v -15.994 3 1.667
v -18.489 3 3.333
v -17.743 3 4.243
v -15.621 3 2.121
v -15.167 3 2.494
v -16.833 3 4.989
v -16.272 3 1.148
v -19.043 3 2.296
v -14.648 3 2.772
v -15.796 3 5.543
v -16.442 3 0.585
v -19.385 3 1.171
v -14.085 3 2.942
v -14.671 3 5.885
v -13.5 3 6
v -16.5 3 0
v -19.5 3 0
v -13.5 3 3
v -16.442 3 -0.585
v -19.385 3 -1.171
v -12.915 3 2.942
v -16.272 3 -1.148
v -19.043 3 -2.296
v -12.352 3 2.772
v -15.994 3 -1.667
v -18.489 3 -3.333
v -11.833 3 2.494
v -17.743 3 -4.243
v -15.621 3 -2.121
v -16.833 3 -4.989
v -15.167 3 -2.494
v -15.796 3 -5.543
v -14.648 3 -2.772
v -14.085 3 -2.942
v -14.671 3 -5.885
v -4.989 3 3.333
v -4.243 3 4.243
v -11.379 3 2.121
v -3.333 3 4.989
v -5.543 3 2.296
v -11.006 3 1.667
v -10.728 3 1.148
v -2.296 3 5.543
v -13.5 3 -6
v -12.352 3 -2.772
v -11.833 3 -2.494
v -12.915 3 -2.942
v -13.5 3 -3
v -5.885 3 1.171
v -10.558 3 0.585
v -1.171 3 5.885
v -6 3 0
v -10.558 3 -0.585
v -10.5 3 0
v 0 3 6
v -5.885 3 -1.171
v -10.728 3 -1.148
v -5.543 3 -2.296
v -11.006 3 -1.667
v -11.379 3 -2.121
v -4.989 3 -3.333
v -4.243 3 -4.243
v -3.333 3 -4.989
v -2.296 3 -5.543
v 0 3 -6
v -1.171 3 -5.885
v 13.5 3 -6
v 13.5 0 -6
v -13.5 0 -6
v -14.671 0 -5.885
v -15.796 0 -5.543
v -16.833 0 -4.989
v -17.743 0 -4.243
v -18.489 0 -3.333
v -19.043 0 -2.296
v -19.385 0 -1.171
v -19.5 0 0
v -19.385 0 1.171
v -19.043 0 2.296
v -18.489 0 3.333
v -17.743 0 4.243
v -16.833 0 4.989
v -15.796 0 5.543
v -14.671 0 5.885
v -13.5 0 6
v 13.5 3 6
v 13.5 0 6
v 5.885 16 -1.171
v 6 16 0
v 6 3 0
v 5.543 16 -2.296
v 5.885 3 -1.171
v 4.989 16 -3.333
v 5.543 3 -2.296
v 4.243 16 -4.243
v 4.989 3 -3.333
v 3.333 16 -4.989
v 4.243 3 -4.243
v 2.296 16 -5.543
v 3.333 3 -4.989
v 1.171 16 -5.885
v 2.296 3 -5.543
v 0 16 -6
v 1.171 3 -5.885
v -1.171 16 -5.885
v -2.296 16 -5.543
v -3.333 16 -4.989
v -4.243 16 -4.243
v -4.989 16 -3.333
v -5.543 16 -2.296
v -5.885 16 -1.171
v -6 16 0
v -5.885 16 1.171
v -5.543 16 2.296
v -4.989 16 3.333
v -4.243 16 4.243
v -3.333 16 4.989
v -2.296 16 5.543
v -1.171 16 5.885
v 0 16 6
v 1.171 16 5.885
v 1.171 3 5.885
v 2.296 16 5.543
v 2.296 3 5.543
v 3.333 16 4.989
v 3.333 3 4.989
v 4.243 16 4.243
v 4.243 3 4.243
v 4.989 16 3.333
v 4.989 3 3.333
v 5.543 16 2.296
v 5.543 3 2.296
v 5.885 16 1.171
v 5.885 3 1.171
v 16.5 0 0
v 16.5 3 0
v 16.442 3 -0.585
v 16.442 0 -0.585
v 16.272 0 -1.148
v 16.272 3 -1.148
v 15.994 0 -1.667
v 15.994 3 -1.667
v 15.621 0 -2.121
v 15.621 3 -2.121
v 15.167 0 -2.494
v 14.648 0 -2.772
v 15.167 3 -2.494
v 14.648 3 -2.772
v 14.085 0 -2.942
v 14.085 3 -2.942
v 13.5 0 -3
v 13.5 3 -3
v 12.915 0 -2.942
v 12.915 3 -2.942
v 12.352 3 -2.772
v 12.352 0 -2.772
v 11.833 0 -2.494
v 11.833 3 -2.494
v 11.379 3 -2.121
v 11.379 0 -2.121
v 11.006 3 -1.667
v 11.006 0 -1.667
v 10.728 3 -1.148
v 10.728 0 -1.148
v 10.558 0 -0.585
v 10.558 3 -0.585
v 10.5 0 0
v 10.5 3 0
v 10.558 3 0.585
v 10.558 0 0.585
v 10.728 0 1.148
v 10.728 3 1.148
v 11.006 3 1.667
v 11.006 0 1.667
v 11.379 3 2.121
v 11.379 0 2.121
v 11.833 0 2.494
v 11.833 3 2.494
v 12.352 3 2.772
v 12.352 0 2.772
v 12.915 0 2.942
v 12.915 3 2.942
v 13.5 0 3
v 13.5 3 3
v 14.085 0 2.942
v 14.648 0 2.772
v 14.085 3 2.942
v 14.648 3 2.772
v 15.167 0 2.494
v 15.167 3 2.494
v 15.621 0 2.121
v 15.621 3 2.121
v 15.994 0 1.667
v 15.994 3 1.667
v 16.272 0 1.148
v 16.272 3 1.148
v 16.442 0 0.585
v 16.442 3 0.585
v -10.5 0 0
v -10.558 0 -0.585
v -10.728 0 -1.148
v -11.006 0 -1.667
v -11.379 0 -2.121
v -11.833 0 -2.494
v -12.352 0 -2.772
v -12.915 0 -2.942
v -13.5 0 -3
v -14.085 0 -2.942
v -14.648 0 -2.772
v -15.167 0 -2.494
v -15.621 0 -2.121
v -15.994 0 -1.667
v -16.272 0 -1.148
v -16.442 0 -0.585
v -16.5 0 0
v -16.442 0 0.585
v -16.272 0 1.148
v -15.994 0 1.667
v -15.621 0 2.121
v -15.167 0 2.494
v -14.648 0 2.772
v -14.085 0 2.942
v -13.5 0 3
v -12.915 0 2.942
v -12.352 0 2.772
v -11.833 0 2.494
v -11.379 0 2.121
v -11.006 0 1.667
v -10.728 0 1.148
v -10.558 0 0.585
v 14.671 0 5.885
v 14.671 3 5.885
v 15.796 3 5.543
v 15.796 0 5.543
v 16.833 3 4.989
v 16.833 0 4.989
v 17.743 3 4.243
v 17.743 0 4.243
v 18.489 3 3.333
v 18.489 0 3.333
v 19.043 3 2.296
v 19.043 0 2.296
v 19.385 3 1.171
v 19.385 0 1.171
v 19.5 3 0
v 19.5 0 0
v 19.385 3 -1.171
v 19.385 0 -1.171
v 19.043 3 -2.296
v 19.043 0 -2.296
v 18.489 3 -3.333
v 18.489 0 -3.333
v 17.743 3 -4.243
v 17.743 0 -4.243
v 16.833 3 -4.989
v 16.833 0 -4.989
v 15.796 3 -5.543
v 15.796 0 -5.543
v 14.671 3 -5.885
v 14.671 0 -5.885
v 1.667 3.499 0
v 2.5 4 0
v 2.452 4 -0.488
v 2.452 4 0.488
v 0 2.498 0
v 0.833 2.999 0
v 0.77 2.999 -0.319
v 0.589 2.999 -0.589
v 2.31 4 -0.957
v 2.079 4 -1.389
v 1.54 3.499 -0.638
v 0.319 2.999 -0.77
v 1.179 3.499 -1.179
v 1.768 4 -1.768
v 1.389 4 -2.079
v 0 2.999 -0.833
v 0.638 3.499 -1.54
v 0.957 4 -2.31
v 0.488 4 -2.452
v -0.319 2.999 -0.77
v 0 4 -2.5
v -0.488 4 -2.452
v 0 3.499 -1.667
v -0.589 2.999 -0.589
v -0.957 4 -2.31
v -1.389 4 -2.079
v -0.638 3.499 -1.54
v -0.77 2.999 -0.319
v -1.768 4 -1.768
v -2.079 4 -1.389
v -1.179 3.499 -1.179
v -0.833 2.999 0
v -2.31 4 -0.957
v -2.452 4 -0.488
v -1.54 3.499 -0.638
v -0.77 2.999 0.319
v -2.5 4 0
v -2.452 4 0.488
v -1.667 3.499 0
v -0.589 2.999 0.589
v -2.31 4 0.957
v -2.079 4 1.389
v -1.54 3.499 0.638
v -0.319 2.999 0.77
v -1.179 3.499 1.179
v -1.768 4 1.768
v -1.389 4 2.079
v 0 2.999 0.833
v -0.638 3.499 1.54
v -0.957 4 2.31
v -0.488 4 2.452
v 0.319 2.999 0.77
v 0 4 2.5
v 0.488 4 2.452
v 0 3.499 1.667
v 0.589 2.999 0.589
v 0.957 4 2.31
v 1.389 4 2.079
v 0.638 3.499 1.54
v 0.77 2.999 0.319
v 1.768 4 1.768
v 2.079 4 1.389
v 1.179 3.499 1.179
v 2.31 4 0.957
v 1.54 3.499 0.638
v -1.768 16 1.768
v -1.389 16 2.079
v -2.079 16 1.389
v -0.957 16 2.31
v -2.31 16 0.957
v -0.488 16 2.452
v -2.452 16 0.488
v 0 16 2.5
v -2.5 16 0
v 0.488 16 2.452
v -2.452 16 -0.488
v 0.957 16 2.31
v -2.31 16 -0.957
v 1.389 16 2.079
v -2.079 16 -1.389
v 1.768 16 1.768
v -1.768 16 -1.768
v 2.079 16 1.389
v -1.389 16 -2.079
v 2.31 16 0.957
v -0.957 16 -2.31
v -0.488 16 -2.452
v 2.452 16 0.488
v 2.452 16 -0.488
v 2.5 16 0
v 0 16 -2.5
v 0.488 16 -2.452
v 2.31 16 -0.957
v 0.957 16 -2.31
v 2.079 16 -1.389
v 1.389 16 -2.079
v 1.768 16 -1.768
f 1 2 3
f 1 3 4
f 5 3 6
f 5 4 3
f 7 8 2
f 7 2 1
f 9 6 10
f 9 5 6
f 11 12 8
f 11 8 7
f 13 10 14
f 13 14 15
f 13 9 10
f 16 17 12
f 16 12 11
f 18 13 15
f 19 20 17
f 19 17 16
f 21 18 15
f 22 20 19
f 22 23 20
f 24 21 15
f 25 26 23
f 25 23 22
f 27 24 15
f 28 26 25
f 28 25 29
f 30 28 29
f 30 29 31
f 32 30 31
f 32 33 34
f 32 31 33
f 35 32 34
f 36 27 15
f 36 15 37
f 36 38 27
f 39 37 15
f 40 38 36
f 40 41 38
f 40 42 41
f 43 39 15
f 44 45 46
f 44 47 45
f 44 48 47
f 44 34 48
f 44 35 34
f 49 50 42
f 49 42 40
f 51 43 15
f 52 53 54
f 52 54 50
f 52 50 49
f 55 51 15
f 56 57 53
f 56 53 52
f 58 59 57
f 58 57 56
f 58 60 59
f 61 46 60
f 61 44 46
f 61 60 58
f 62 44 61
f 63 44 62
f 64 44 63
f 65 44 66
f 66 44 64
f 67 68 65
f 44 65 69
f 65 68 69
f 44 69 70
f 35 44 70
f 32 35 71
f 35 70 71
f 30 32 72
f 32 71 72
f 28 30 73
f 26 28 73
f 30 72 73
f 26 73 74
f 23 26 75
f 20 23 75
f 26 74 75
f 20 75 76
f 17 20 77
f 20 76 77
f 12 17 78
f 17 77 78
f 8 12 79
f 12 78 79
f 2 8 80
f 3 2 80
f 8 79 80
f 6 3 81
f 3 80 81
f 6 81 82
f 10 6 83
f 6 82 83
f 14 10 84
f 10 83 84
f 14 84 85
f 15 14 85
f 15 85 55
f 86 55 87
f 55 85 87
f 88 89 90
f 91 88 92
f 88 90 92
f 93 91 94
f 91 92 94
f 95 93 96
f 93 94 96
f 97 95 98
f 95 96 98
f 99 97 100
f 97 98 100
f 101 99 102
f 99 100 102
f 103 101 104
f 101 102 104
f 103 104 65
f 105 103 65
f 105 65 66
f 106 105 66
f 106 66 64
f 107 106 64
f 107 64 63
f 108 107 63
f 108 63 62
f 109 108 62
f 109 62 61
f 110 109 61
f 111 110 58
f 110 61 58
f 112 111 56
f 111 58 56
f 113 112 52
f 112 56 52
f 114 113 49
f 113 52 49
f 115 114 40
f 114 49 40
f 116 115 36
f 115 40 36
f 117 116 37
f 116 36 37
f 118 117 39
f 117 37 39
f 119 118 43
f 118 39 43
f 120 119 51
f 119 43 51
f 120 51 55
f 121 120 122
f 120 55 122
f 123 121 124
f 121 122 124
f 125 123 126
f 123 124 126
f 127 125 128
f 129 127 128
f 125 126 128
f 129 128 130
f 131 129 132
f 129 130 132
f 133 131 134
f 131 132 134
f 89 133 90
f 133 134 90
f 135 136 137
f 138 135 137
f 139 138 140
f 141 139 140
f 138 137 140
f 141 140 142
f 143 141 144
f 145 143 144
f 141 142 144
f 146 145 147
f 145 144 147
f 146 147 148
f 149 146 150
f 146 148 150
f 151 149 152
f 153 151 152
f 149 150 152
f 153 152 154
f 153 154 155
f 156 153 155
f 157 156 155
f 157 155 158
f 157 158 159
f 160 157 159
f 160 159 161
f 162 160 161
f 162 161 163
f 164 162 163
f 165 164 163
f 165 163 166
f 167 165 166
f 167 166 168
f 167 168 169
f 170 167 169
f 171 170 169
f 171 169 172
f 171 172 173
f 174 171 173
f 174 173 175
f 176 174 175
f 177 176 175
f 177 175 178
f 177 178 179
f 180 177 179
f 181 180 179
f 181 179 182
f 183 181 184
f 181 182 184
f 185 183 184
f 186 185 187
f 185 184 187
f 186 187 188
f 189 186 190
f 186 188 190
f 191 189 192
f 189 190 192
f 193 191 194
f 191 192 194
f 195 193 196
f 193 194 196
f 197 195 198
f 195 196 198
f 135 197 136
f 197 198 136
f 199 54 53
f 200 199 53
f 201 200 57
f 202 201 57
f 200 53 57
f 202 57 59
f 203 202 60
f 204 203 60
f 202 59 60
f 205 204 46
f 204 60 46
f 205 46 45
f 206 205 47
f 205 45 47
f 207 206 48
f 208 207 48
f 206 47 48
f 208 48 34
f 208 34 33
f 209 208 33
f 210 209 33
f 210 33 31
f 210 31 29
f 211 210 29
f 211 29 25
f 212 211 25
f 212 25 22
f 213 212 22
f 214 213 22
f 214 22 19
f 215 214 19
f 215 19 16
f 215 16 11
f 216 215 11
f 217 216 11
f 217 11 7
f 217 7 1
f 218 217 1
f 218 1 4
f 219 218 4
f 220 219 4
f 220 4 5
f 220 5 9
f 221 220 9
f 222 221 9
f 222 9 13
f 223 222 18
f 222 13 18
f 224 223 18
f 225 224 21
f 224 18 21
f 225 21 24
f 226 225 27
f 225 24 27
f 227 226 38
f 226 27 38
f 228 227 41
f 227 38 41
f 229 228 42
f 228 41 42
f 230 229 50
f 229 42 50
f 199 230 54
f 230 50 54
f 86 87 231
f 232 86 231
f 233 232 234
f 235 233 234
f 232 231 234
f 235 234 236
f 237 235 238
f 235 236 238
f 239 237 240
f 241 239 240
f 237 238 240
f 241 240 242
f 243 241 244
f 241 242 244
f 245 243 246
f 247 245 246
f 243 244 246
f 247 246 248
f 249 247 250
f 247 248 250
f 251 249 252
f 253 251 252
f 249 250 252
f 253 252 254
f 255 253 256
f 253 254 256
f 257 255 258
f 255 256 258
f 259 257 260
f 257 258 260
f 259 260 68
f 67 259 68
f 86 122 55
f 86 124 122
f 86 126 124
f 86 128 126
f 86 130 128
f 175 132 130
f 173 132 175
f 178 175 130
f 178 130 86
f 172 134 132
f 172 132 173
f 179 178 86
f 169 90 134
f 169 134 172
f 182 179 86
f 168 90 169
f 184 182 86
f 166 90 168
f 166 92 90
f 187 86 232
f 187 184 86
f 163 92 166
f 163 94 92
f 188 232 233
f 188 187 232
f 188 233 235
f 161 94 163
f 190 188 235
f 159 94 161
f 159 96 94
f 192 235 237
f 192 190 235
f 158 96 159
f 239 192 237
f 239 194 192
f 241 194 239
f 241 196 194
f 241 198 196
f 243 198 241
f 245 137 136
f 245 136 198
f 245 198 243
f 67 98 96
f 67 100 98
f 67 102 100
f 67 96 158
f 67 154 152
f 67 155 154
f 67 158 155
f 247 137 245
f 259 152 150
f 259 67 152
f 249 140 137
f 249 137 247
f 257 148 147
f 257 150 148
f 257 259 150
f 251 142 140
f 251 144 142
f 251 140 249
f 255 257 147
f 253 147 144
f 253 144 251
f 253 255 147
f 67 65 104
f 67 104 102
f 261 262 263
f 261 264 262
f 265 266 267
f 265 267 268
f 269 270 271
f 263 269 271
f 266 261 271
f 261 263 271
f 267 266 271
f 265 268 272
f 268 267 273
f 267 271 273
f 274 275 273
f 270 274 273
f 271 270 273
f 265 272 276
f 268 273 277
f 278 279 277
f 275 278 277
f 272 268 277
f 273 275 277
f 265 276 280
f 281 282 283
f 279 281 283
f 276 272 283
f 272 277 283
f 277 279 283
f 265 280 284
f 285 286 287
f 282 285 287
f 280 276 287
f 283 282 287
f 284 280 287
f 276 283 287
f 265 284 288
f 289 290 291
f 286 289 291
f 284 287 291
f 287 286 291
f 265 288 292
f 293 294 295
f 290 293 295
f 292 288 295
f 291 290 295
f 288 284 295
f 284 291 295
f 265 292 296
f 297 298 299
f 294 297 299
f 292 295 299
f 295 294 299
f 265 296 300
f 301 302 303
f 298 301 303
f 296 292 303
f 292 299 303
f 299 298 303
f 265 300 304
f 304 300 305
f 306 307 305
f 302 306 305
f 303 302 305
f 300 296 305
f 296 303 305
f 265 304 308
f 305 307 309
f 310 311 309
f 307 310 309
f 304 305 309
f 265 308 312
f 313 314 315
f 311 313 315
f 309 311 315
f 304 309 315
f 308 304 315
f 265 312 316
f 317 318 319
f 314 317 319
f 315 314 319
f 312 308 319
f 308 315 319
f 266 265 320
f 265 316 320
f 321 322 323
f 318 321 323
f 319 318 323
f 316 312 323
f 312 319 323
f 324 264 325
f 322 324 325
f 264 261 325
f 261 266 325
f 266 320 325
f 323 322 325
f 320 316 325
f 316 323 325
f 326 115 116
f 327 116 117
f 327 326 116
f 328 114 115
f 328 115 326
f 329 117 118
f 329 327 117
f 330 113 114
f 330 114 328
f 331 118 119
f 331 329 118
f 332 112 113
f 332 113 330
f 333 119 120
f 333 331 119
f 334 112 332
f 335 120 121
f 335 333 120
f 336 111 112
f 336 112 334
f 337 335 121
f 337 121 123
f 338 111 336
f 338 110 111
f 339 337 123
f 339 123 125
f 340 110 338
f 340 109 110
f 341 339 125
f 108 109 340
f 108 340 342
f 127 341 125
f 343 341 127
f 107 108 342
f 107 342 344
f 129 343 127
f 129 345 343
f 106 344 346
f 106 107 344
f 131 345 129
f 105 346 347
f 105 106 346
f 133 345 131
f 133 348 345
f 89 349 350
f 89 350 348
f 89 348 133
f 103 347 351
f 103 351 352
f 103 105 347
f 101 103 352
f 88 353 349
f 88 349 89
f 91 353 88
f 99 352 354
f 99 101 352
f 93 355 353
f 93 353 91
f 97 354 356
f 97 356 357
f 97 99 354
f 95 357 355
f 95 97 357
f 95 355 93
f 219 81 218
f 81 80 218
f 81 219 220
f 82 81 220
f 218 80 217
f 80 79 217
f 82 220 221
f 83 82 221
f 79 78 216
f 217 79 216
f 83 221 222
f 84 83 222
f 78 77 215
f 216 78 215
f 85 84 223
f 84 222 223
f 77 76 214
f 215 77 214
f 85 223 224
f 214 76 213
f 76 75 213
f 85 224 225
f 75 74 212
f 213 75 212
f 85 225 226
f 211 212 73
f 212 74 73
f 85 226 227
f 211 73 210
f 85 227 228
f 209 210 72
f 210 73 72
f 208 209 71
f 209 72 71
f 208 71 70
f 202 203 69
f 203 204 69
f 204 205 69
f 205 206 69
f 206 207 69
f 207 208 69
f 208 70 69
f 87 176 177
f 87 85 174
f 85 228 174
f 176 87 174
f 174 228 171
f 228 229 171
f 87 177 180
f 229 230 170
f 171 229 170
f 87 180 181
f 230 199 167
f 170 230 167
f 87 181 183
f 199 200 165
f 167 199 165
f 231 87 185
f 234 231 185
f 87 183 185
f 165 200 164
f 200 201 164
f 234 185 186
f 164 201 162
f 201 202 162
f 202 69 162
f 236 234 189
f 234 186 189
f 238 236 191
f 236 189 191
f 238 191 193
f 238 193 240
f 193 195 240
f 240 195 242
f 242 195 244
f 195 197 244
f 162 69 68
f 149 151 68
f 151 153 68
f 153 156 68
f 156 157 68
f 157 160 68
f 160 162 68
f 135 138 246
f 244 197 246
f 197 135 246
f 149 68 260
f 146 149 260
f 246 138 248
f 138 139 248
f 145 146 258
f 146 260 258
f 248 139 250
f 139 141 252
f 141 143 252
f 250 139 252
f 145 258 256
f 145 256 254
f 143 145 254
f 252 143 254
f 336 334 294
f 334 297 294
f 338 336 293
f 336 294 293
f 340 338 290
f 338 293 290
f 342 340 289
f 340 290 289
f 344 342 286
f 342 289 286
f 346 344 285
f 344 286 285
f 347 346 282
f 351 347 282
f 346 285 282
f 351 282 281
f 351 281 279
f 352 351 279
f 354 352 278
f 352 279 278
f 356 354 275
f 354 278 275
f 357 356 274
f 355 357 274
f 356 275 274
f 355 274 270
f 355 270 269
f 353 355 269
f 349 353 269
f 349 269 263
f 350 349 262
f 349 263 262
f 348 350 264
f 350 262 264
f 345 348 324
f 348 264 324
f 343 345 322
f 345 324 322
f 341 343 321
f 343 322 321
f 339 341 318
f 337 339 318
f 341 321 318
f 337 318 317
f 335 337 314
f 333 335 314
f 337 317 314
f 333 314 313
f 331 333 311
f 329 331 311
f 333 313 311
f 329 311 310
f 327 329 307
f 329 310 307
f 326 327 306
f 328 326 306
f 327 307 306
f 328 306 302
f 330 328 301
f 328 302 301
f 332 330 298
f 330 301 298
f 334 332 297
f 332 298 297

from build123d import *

# Parameters (mm, degrees)
SKETCH_1_R             = 6
EXTRUDE_1_DEPTH        = 3
SKETCH_2_R             = 6
EXTRUDE_2_DEPTH        = 13
HOLE_WIZARD_M6_1_D     = 5
HOLE_WIZARD_M6_1_DEPTH = 12
HOLE_WIZARD_M6_1_TIP   = 1.502151548
SKETCH_6_R             = 3
CUT_EXTRUDE_1_DEPTH    = 10


with BuildPart() as part:
    # 草图1 → 凸台-拉伸1 (new body)
    with BuildSketch(Plane(origin=(0, 0, 0), x_dir=(1, 0, 0), z_dir=(0, 1, 0))):
        with Locations((-13.5, 0)):
            Circle(SKETCH_1_R)
        with BuildLine():
            Line((13.5, 6), (-13.5, 6))
            ThreePointArc((-13.5, 6), (-9.257359313, 4.242640687), (-7.5, 0))
            ThreePointArc((-7.5, 0), (-9.257359313, -4.242640687), (-13.5, -6))
            Line((-13.5, -6), (13.5, -6))
            ThreePointArc((13.5, -6), (7.5, 0), (13.5, 6))
        make_face()
        with Locations((13.5, 0)):
            Circle(SKETCH_1_R)
        with BuildLine():
            Line((-13.5, -6), (-13.5, 6))
            ThreePointArc((-13.5, 6), (-19.5, 0), (-13.5, -6))
        make_face()
        with BuildLine():
            ThreePointArc((19.5, 0), (17.742640687, 4.242640687), (13.5, 6))
            Line((13.5, 6), (13.5, -6))
            ThreePointArc((13.5, -6), (17.742640687, -4.242640687), (19.5, 0))
        make_face()
    extrude(amount=EXTRUDE_1_DEPTH)

    # 草图2 → 凸台-拉伸2 (add)
    with BuildSketch(Plane(origin=(0, 3, 0), x_dir=(1, 0, 0), z_dir=(0, 1, 0))):
        Circle(SKETCH_2_R)
    extrude(amount=EXTRUDE_2_DEPTH)

    # M6 螺纹孔1
    with Locations(Plane(origin=(0, 16, 0), x_dir=(1, 0, 0), z_dir=(0, 1, 0))):
        with Locations((0, 0)):
            Hole(HOLE_WIZARD_M6_1_D / 2, depth=HOLE_WIZARD_M6_1_DEPTH)
            with Locations((0, 0, -(HOLE_WIZARD_M6_1_DEPTH + HOLE_WIZARD_M6_1_TIP / 2))):  # 118° drill point
                Cone(0, HOLE_WIZARD_M6_1_D / 2, HOLE_WIZARD_M6_1_TIP, mode=Mode.SUBTRACT)

    # 草图6 → 切除-拉伸1 (cut)
    with BuildSketch(Plane(origin=(0, 3, 0), x_dir=(1, 0, 0), z_dir=(0, 1, 0))):
        with Locations((-13.5, 0)):
            Circle(SKETCH_6_R)
        with Locations((13.5, 0)):
            Circle(SKETCH_6_R)
    extrude(amount=-CUT_EXTRUDE_1_DEPTH, mode=Mode.SUBTRACT)


solid = part.part
